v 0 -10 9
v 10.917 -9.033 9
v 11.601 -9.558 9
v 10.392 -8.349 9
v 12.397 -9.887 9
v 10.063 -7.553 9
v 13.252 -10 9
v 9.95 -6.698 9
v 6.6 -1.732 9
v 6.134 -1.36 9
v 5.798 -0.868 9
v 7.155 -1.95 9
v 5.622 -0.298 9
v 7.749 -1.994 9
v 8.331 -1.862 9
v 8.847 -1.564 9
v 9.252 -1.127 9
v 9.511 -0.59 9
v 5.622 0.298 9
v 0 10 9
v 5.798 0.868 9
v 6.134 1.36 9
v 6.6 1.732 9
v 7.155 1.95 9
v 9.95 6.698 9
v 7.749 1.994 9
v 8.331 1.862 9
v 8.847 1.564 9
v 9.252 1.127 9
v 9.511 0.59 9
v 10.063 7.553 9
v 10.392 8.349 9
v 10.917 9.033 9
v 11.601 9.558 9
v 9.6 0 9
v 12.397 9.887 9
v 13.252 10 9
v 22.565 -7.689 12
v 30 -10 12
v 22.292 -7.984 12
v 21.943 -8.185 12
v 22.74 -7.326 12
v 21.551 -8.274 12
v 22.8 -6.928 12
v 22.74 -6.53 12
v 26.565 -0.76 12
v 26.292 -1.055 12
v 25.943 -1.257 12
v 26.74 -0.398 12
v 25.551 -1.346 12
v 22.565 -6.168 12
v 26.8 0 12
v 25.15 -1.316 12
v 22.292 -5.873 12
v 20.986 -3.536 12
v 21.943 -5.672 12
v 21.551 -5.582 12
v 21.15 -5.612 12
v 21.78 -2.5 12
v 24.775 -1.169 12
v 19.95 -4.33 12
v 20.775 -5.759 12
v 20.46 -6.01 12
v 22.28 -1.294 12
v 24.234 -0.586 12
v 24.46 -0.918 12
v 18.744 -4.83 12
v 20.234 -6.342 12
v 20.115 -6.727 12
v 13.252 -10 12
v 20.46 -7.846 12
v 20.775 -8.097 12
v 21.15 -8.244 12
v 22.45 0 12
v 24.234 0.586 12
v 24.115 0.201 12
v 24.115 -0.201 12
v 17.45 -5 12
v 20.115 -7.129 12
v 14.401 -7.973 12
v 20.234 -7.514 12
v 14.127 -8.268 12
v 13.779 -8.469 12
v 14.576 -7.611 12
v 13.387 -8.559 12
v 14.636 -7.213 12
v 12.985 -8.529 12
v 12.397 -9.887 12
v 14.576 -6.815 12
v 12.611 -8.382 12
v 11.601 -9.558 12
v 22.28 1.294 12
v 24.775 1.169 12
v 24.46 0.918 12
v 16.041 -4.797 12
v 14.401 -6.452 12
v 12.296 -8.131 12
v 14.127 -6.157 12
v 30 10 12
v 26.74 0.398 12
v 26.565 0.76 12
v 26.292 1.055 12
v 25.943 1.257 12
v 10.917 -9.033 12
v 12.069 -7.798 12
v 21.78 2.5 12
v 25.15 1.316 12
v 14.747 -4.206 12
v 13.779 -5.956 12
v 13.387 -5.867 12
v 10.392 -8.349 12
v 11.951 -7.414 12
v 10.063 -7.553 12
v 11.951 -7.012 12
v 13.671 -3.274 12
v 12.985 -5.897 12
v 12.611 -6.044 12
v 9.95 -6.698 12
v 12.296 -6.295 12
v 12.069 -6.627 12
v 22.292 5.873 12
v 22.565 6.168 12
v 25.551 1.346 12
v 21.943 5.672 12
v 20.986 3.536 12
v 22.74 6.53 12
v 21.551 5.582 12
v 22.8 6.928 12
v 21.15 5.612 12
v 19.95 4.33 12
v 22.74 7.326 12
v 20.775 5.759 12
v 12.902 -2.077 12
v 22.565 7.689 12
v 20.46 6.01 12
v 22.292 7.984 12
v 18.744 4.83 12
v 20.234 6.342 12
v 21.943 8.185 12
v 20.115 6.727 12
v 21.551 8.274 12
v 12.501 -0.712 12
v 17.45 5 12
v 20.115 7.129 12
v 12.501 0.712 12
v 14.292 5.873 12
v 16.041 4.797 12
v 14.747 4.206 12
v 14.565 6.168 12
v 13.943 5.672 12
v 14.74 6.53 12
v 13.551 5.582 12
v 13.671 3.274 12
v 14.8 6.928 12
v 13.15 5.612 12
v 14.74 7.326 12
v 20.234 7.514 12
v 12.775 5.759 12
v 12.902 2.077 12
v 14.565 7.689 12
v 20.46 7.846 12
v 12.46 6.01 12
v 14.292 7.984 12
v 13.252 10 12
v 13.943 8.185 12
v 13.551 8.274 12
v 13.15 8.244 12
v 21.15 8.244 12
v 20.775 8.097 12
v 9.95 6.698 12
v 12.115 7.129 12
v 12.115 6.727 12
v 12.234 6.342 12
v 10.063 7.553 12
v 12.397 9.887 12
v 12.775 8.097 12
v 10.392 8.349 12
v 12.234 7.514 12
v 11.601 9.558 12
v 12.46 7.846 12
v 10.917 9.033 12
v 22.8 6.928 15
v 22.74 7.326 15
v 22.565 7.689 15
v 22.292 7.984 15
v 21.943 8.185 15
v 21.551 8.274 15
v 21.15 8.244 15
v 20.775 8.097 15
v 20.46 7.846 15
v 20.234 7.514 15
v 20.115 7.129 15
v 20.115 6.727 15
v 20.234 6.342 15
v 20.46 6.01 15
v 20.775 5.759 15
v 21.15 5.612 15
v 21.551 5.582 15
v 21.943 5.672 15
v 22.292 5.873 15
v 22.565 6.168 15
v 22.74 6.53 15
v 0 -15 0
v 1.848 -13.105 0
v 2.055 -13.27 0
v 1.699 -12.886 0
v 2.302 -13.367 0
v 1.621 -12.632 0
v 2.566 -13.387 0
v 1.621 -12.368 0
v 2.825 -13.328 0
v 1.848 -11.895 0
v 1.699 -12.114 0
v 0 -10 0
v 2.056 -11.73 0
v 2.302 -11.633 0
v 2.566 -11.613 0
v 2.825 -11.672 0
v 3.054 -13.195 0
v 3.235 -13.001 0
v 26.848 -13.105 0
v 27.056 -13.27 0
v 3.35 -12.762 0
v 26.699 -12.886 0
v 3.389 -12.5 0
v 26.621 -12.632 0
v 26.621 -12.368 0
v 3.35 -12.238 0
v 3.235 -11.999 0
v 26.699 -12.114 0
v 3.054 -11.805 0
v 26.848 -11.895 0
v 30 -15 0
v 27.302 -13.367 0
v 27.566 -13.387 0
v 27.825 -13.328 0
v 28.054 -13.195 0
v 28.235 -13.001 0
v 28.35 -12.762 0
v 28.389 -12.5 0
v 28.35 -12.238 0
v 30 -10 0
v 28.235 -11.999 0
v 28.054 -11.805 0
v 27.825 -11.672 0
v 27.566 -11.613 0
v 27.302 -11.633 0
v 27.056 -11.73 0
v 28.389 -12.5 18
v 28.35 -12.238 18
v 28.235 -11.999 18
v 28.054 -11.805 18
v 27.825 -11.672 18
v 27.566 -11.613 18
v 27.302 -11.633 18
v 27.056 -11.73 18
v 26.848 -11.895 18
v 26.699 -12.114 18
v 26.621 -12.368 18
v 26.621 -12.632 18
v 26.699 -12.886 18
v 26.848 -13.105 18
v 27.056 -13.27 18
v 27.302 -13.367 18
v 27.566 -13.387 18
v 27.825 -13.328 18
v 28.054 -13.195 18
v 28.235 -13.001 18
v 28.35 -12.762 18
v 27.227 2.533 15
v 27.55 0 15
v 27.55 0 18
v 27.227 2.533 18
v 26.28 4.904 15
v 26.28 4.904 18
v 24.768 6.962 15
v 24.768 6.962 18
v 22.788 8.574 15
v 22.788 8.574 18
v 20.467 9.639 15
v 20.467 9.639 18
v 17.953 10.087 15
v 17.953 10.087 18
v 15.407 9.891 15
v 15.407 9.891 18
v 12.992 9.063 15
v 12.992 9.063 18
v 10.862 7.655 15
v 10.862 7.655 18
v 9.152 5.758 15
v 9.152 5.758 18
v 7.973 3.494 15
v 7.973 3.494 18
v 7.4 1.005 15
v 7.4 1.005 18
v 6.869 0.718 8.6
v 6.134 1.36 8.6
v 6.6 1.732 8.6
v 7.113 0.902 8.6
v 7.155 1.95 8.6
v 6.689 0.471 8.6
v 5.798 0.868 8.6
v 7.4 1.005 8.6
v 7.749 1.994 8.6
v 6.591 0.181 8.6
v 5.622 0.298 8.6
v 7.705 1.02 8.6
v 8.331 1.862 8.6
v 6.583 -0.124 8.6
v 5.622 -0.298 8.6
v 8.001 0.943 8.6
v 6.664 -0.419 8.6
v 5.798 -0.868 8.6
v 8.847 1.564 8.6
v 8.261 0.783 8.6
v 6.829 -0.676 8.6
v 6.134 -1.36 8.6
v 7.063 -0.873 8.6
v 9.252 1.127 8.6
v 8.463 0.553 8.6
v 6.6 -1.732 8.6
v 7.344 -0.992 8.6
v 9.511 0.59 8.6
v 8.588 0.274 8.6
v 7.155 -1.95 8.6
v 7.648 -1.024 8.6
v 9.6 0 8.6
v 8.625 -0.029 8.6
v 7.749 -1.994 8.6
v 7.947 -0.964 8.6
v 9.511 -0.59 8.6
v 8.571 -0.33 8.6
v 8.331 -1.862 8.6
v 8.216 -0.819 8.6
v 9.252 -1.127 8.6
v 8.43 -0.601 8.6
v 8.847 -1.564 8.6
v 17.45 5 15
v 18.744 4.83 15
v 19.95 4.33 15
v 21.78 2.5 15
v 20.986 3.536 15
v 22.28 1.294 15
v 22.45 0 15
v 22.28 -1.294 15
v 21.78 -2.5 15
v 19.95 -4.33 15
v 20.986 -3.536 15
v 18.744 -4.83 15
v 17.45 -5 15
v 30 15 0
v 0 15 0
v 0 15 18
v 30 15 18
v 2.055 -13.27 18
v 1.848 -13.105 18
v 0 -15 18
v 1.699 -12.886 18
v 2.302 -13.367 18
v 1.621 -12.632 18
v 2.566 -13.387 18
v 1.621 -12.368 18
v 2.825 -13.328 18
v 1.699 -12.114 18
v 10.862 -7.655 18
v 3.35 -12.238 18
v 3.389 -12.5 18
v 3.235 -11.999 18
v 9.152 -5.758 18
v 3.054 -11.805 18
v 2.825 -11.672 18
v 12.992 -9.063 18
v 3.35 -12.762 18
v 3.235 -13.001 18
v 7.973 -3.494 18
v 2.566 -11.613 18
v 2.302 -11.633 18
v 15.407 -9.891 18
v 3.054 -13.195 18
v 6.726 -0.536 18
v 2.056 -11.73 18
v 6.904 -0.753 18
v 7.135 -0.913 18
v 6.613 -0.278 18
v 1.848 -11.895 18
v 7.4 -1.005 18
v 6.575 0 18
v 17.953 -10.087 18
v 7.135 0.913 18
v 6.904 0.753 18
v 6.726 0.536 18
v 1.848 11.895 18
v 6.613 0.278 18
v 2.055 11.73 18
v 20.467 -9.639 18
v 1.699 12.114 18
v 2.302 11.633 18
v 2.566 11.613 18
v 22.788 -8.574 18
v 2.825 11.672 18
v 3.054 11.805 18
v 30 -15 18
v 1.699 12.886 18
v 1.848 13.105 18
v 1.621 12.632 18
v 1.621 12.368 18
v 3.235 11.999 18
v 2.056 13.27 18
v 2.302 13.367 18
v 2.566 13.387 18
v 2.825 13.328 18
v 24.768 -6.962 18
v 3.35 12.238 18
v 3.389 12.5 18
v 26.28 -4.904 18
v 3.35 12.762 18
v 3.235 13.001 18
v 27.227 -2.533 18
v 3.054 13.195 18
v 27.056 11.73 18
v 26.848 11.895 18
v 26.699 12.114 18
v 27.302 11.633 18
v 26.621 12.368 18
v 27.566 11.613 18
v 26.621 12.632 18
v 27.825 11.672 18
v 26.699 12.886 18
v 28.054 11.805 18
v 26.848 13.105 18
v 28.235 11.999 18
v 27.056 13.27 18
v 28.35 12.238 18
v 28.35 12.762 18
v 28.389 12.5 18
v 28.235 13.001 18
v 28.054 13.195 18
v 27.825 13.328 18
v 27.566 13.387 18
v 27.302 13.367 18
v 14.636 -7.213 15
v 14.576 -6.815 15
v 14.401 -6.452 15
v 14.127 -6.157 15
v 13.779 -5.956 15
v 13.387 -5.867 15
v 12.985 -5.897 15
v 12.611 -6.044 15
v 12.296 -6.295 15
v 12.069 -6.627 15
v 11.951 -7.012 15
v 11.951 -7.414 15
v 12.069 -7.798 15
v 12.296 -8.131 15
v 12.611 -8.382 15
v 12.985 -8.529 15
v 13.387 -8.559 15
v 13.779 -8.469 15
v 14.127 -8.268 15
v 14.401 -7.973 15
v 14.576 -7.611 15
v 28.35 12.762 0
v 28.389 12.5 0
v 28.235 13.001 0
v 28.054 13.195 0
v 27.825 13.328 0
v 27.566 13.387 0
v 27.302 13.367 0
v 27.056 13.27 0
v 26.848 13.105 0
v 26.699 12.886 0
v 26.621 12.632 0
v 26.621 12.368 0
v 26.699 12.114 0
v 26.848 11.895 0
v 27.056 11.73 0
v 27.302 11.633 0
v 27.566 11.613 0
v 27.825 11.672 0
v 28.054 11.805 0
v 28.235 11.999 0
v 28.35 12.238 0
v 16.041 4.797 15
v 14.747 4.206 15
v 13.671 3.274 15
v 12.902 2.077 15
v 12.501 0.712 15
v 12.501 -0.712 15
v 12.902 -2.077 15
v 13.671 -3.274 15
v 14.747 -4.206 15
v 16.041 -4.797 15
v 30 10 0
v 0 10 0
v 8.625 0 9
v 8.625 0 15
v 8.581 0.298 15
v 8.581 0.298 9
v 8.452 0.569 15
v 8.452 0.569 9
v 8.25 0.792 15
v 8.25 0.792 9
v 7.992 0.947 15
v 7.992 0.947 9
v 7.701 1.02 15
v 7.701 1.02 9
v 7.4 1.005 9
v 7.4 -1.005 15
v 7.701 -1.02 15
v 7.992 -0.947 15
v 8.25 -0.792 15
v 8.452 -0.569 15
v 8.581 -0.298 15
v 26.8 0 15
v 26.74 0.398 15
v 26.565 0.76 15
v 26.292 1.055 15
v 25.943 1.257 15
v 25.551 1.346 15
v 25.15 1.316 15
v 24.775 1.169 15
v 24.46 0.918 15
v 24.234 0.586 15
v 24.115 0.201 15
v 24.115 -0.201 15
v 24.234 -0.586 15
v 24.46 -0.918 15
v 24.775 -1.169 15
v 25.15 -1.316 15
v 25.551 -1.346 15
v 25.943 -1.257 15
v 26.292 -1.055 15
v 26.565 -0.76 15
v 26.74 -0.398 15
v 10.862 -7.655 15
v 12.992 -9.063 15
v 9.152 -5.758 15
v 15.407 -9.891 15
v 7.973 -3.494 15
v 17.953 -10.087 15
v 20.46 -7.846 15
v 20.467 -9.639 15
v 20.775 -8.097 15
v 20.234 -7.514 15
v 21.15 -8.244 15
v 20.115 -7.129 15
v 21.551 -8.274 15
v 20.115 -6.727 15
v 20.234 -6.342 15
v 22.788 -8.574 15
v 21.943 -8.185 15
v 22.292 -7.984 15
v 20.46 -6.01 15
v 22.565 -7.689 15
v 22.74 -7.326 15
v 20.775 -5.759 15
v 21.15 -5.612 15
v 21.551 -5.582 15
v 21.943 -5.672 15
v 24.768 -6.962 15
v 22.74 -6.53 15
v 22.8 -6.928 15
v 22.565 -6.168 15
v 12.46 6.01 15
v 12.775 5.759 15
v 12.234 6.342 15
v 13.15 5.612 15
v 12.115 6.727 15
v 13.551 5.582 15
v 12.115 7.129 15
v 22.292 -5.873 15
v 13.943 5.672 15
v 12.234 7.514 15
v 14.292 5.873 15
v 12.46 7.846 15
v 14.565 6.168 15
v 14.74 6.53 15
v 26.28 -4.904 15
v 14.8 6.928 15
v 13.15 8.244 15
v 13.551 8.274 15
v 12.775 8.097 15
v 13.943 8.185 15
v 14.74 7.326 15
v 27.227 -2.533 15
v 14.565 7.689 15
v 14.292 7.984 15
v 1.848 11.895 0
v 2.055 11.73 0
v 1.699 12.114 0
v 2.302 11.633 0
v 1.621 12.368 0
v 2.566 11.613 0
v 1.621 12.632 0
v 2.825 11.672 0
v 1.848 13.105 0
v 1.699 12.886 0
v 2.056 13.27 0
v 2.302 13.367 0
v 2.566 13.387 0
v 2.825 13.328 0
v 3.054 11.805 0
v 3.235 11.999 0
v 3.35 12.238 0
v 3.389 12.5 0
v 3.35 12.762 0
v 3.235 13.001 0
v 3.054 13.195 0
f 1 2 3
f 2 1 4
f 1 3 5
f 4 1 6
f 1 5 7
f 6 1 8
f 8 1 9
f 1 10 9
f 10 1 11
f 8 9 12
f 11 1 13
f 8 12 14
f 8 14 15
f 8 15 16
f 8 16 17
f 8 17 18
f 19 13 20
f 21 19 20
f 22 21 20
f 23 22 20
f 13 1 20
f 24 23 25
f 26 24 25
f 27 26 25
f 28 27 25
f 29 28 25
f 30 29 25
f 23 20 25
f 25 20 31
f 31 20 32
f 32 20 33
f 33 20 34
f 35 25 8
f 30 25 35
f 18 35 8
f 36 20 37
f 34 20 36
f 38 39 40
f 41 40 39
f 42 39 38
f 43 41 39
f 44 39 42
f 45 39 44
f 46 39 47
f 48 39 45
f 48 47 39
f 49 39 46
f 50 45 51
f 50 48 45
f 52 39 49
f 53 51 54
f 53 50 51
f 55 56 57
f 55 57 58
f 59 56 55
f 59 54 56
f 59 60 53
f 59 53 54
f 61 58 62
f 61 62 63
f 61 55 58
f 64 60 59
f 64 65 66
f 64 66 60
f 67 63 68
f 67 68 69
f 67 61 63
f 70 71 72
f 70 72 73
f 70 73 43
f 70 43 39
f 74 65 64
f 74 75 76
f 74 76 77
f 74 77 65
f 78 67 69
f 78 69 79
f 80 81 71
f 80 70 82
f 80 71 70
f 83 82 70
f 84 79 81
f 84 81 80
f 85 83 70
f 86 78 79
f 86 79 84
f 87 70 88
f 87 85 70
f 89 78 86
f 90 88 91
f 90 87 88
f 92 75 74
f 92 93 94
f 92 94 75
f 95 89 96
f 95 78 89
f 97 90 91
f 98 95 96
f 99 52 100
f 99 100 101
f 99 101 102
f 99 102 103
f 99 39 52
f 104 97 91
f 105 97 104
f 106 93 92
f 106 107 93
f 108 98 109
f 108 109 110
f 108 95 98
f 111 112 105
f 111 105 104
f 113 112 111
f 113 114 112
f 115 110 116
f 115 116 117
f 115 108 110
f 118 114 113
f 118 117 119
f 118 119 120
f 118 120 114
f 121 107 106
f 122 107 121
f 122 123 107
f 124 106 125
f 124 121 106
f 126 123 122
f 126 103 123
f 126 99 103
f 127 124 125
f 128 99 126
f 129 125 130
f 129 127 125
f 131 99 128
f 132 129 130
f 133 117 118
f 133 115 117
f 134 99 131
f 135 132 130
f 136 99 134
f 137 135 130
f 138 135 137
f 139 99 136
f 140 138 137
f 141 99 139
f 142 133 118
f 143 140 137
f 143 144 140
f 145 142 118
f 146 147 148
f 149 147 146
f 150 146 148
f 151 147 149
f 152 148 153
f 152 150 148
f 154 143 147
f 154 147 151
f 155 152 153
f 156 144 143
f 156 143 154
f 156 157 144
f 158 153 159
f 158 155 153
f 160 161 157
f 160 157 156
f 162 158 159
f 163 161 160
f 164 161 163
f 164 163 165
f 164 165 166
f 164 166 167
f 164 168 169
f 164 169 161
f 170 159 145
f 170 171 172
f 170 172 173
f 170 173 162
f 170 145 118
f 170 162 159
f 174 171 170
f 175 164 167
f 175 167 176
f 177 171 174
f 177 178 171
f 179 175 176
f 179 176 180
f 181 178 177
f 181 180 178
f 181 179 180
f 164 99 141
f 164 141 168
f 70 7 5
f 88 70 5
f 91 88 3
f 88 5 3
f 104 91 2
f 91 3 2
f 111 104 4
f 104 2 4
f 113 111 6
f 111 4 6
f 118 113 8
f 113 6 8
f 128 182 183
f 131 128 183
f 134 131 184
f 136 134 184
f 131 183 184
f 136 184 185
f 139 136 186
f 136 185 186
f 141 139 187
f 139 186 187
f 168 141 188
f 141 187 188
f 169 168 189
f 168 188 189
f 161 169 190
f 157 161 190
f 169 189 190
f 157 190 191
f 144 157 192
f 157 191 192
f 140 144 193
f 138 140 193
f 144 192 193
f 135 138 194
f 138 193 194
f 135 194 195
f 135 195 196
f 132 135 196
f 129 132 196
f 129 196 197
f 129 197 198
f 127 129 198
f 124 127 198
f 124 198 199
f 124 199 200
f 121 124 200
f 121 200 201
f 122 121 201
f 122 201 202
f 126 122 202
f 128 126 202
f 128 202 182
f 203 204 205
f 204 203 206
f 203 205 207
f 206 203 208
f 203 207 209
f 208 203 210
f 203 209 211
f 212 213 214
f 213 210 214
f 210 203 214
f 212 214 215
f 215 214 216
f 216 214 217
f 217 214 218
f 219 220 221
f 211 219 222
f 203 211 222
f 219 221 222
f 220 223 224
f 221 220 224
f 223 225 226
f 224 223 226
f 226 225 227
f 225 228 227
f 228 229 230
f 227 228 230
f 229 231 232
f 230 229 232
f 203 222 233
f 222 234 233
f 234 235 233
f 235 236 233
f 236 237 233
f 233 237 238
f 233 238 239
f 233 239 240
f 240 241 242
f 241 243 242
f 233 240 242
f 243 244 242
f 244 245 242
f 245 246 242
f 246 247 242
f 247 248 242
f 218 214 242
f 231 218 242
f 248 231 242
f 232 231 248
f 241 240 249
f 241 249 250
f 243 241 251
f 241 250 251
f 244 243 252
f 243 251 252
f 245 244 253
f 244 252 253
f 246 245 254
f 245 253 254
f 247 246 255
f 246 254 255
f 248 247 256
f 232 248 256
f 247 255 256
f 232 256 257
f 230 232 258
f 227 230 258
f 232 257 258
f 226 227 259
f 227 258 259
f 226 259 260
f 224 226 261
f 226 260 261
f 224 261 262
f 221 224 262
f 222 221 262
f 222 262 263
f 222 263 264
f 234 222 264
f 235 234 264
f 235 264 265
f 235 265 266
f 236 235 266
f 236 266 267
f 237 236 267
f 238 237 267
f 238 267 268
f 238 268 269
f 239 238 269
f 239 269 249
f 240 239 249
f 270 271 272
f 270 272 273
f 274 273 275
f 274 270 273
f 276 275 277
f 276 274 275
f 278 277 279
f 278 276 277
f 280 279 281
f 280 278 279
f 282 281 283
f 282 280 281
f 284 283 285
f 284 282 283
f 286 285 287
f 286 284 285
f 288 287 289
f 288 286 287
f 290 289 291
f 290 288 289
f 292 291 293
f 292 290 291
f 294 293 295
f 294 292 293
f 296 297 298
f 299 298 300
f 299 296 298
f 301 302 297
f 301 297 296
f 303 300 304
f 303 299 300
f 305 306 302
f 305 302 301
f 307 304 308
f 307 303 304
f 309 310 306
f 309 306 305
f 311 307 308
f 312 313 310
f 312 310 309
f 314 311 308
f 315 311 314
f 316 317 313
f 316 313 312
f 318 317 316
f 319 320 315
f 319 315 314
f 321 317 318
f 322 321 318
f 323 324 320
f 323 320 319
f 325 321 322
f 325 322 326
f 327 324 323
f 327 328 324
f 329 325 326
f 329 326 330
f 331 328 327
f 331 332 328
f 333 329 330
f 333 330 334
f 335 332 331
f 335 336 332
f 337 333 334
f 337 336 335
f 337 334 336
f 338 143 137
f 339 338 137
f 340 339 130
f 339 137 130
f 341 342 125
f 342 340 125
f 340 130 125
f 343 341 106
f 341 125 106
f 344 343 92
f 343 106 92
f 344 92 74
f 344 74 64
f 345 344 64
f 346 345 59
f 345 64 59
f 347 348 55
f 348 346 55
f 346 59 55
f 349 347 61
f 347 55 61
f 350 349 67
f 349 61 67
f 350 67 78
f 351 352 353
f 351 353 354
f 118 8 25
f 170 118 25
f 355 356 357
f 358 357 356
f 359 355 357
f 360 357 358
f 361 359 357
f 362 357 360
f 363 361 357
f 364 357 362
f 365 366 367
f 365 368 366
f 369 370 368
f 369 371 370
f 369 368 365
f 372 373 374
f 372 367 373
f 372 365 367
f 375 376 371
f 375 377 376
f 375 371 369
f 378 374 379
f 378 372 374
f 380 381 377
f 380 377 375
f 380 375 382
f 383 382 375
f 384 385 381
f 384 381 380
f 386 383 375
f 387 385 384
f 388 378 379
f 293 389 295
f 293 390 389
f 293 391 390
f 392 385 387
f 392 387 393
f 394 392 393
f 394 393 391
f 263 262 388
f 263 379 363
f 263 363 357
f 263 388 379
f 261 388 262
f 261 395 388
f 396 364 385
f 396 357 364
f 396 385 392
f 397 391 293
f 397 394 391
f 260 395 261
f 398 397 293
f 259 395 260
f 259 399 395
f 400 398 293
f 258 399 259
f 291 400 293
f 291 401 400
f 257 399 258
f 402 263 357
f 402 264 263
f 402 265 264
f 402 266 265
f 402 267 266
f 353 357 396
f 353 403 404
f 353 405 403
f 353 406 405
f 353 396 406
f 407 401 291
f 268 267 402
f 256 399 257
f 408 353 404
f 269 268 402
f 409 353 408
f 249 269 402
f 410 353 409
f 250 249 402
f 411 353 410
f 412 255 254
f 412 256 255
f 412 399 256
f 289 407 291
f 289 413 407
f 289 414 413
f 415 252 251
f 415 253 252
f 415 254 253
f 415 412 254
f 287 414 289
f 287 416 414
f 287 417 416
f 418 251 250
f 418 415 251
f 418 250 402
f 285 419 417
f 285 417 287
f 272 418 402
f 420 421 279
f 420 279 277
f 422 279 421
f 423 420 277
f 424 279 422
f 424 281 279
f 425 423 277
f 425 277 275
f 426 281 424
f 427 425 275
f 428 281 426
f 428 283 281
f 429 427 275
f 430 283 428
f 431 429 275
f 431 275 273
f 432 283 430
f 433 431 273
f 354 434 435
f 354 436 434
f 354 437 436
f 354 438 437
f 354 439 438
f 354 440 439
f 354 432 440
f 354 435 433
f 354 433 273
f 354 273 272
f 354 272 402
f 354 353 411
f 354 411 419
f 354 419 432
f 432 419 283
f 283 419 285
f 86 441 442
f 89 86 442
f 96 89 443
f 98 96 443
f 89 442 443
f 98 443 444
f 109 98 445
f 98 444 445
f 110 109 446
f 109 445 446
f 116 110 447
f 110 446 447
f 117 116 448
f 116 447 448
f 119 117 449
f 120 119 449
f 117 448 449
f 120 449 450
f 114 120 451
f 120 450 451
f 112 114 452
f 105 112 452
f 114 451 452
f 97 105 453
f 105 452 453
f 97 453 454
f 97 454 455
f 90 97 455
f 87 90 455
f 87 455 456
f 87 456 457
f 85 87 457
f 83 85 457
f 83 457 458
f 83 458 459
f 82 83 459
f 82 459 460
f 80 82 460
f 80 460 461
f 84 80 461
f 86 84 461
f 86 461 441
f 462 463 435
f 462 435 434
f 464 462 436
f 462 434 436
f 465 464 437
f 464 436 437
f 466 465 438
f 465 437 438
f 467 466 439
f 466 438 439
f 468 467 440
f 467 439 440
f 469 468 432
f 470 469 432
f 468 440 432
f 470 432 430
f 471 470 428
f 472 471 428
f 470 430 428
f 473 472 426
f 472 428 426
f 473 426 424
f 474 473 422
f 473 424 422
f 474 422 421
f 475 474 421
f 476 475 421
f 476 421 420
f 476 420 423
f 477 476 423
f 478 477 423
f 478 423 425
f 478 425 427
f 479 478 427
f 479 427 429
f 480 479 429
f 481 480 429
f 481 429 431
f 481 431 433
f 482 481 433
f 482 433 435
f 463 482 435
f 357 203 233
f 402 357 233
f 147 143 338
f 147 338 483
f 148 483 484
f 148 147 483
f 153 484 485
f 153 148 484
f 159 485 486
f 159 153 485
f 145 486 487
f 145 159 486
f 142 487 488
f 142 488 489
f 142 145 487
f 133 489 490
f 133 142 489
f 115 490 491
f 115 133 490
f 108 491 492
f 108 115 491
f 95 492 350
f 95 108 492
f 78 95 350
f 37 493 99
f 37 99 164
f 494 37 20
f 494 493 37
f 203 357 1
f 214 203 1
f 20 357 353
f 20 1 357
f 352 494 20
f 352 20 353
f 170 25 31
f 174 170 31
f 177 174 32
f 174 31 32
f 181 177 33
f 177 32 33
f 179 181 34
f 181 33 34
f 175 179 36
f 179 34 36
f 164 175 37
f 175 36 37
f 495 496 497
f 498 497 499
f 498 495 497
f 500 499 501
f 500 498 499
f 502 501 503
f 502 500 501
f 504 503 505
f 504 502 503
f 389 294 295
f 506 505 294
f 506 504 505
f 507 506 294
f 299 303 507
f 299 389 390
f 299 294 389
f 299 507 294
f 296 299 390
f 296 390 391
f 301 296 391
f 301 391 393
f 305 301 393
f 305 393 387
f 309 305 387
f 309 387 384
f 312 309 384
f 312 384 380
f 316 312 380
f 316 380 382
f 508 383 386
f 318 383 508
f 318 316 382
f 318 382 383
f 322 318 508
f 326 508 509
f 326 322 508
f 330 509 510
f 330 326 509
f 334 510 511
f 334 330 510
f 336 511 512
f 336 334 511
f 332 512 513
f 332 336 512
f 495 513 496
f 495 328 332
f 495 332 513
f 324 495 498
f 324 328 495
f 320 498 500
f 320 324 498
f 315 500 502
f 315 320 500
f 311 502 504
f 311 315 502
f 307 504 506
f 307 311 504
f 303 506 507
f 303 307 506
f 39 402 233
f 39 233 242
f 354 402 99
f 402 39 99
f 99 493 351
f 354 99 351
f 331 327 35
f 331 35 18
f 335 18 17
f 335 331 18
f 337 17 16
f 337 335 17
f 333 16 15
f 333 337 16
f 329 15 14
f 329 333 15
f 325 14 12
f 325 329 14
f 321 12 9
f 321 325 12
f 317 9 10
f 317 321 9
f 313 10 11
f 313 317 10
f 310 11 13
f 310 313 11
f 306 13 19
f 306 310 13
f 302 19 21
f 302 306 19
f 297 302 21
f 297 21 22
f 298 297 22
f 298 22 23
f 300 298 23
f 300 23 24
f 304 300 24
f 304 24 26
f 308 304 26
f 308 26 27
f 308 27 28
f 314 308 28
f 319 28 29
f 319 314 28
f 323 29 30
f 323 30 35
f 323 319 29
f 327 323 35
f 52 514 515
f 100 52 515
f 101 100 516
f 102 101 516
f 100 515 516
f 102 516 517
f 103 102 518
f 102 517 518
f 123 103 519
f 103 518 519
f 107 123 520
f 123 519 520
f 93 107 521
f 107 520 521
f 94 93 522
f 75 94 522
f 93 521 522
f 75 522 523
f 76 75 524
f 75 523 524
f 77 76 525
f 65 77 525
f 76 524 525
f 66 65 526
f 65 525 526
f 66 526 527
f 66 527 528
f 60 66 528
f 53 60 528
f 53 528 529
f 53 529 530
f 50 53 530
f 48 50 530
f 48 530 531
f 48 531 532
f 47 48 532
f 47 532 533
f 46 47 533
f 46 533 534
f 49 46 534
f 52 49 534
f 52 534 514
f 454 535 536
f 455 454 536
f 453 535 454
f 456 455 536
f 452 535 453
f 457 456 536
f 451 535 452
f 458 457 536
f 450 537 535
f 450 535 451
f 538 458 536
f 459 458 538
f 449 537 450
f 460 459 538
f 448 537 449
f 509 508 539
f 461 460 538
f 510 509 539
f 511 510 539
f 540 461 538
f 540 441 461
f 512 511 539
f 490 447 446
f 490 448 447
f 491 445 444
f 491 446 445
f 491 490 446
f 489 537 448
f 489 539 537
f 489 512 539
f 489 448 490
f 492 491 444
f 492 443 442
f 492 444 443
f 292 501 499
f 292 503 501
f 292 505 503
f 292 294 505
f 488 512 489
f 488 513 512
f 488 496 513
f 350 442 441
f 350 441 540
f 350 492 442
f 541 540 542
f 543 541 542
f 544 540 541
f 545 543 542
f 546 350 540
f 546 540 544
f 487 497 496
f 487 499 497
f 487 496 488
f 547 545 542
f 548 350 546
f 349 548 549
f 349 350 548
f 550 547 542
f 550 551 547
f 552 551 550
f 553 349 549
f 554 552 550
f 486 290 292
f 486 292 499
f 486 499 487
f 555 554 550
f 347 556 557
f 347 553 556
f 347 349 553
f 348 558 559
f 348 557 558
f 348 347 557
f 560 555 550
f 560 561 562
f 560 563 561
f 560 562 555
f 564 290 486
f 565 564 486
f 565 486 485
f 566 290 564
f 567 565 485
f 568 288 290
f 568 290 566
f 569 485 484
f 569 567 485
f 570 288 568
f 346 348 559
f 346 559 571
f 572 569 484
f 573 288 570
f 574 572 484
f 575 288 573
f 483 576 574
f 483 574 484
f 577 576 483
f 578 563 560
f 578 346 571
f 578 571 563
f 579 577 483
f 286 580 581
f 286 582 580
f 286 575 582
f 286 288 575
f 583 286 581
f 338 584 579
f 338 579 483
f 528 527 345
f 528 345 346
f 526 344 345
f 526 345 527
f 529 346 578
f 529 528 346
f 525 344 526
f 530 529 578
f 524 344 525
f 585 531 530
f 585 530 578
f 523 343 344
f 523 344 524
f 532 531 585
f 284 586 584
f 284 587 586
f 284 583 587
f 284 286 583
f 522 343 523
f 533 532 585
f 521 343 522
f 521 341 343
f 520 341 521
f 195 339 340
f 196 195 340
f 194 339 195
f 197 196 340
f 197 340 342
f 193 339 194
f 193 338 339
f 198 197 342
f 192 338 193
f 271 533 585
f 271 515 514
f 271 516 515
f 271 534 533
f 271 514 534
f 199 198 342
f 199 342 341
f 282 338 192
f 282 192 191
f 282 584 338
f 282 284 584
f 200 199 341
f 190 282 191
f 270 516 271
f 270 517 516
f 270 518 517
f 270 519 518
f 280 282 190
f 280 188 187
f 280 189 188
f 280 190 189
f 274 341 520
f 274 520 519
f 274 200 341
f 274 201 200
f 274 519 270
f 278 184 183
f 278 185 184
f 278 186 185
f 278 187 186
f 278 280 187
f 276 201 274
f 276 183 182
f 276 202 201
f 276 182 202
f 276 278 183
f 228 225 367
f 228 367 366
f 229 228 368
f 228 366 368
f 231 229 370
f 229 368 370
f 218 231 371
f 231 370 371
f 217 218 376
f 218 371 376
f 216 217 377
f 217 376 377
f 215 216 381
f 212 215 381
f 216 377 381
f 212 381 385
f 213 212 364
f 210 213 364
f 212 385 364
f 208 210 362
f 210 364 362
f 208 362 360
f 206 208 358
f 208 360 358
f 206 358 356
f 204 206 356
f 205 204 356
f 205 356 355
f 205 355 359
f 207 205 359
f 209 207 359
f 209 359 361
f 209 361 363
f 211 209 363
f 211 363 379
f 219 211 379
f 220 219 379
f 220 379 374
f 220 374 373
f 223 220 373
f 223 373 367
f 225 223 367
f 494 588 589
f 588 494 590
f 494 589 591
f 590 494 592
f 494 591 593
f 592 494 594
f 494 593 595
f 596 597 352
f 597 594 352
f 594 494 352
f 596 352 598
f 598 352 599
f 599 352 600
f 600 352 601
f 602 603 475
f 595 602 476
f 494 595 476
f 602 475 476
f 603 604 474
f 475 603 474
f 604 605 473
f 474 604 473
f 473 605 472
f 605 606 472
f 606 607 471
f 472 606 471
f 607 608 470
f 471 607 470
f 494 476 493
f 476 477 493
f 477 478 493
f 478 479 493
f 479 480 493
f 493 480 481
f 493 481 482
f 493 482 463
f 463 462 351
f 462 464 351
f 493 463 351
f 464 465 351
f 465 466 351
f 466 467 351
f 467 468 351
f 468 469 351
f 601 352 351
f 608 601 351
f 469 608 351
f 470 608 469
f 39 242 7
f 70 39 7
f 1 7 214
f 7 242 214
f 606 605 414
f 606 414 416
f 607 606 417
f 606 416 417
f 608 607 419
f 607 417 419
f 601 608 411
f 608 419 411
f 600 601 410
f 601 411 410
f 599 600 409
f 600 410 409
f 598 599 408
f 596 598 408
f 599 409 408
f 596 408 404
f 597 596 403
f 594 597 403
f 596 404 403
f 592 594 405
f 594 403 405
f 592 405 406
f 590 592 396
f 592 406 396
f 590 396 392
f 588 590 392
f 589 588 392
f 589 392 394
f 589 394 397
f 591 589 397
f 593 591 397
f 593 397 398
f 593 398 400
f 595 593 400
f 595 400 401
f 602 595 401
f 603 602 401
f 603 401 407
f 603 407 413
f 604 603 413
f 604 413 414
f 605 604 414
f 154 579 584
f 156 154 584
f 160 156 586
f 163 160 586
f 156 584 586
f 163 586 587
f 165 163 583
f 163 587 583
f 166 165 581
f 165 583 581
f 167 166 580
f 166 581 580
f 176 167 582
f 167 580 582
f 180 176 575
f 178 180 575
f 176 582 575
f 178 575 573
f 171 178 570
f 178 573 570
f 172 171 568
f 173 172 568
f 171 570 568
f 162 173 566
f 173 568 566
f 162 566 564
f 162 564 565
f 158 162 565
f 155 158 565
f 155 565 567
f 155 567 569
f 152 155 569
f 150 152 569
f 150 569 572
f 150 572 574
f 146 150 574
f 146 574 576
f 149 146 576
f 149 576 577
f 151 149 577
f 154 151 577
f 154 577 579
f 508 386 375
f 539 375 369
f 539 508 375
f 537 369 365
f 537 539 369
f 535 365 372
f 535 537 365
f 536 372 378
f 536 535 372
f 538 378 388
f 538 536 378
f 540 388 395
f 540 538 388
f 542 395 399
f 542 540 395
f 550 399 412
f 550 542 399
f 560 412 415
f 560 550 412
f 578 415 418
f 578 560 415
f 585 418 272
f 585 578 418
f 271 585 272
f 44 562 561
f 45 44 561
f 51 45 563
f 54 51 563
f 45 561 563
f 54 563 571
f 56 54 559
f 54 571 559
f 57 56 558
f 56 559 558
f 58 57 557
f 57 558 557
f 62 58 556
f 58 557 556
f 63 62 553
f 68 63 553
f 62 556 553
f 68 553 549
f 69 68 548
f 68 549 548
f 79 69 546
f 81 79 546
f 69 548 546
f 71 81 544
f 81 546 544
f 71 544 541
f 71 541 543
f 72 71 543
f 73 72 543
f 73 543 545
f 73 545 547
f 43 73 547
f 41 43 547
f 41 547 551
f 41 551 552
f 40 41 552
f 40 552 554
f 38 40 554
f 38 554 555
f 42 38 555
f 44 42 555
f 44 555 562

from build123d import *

# Parameters (mm, degrees)
SKETCH2_W              = 30
SKETCH2_H              = 30
SKETCH2_R              = 5
SKETCH2_R_2            = 1.025
BOSS_EXTRUDE1_DEPTH    = 18
SKETCH3_W              = 30
SKETCH3_H              = 20
CUT_EXTRUDE1_DEPTH     = 9
F_2_56_TAPPED_HOLE1_D  = 1.778
CUT_EXTRUDE2_START     = -3
SKETCH8_R              = 10.1
SKETCH8_R_2            = 5
SKETCH8_R_3            = 1.025
CUT_EXTRUDE2_DEPTH     = 3
BOSS_EXTRUDE2_START    = 0.4
SKETCH9_R              = 2
SKETCH9_R_2            = 1.025
BOSS_EXTRUDE2_DEPTH    = 0.4
SKETCH10_W             = 20.050000056
SKETCH10_H             = 20
CUT_EXTRUDE3_DEPTH     = 2.999999892
FILLET1_START          = 9
FILLET1_DEPTH          = 4
M2_5_CLEARANCE_HOLE1_D = 2.7


with BuildPart() as part:
    # Sketch2 → Boss-Extrude1 (new body)
    # profile 1 of 2: a face of its own
    with BuildSketch(Plane.XY):
        with Locations((15, 0)):
            Rectangle(SKETCH2_W, SKETCH2_H)
        with Locations((17.449999944, 0)):
            Circle(SKETCH2_R, mode=Mode.SUBTRACT)
        with Locations((7.599999986, 0)):
            Circle(SKETCH2_R_2, mode=Mode.SUBTRACT)
    # profile 2 of 2: a face of its own
    with BuildSketch(Plane.XY):
        with BuildLine():
            ThreePointArc((22.449999944, 0), (20.98553385, -3.535533906), (17.449999944, -5))
            Line((17.449999944, -5), (30, -5))
            Line((30, -5), (30, 5))
            Line((30, 5), (17.449999944, 5))
            ThreePointArc((17.449999944, 5), (20.98553385, 3.535533906), (22.449999944, 0))
        make_face()
    extrude(amount=BOSS_EXTRUDE1_DEPTH)

    # Sketch3 → Cut-Extrude1 (cut)
    with BuildSketch(Plane(origin=(0, 0, 0), x_dir=(-1, 0, 0), z_dir=(0, 0, -1))):
        with Locations((-15, 0)):
            Rectangle(SKETCH3_W, SKETCH3_H)
    extrude(amount=-CUT_EXTRUDE1_DEPTH, mode=Mode.SUBTRACT)

    # #2-56 Tapped Hole1 (through all)
    with Locations(Plane(origin=(0, 0, 0), x_dir=(-1, 0, 0), z_dir=(0, 0, -1))):
        with Locations((-27.5, 12.5), (-27.5, -12.5), (-2.5, -12.5), (-2.5, 12.5)):
            Hole(F_2_56_TAPPED_HOLE1_D / 2)

    # Sketch8 → Cut-Extrude2 (cut)
    # profile 1 of 2: a face of its own
    with BuildSketch(Plane.XY.offset(18).offset(CUT_EXTRUDE2_START)):
        with Locations((17.449999944, 0)):
            Circle(SKETCH8_R)
        with Locations(Location((17.449999944, 0, 0), (0, 0, 180))):
            Circle(SKETCH8_R_2, mode=Mode.SUBTRACT)
    # profile 2 of 2: a face of its own
    with BuildSketch(Plane.XY.offset(18).offset(CUT_EXTRUDE2_START)):
        with Locations(Location((7.599999986, 0, 0), (0, 0, 180))):
            Circle(SKETCH8_R_3)
    extrude(amount=CUT_EXTRUDE2_DEPTH, mode=Mode.SUBTRACT)

    # Sketch9 → Boss-Extrude2 (add)
    with BuildSketch(Plane(origin=(0, 0, 9), x_dir=(-1, 0, 0), z_dir=(0, 0, -1)).offset(BOSS_EXTRUDE2_START)):
        with Locations(Location((-7.599999986, 0, 0), (0, 0, 180))):
            Circle(SKETCH9_R)
        with Locations(Location((-7.599999986, 0, 0), (0, 0, 78.757190581))):
            Circle(SKETCH9_R_2, mode=Mode.SUBTRACT)
    extrude(amount=-BOSS_EXTRUDE2_DEPTH)

    # Sketch10 → Cut-Extrude3 (cut)
    with BuildSketch(Plane(origin=(0, 0, 9), x_dir=(-1, 0, 0), z_dir=(0, 0, -1))):
        with Locations((-19.974999972, 0)):
            Rectangle(SKETCH10_W, SKETCH10_H)
    extrude(amount=-CUT_EXTRUDE3_DEPTH, mode=Mode.SUBTRACT)

    # Fillet1: read off the stored shape, not the designer's step
    # Fillet1 outline → Fillet1 (add)
    with BuildSketch(Plane.XY.offset(FILLET1_START)):
        with BuildLine():
            Line((9.949999944, -10), (13.251999944, -10))
            ThreePointArc((13.251999944, -10), (10.917133353, -9.032866591), (9.949999944, -6.698))
            Line((9.949999944, -6.698), (9.949999944, -10))
        make_face()
        with BuildLine():
            Line((9.949999944, 10), (9.949999944, 6.698))
            ThreePointArc((9.949999944, 6.698), (10.917133353, 9.032866591), (13.251999944, 10))
            Line((13.251999944, 10), (9.949999944, 10))
        make_face()
    extrude(amount=FILLET1_DEPTH)

    # M2.5 Clearance Hole1 (through all)
    with Locations(Plane(origin=(0, 0, 11.999999892), x_dir=(-1, 0, 0), z_dir=(0, 0, -1))):
        with Locations((-21.449999944, 6.92820323), (-13.449999944, 6.92820323), (-13.285717643, -7.212748522), (-21.449999944, -6.92820323), (-25.449999944, 0)):
            Hole(M2_5_CLEARANCE_HOLE1_D / 2)


solid = part.part
